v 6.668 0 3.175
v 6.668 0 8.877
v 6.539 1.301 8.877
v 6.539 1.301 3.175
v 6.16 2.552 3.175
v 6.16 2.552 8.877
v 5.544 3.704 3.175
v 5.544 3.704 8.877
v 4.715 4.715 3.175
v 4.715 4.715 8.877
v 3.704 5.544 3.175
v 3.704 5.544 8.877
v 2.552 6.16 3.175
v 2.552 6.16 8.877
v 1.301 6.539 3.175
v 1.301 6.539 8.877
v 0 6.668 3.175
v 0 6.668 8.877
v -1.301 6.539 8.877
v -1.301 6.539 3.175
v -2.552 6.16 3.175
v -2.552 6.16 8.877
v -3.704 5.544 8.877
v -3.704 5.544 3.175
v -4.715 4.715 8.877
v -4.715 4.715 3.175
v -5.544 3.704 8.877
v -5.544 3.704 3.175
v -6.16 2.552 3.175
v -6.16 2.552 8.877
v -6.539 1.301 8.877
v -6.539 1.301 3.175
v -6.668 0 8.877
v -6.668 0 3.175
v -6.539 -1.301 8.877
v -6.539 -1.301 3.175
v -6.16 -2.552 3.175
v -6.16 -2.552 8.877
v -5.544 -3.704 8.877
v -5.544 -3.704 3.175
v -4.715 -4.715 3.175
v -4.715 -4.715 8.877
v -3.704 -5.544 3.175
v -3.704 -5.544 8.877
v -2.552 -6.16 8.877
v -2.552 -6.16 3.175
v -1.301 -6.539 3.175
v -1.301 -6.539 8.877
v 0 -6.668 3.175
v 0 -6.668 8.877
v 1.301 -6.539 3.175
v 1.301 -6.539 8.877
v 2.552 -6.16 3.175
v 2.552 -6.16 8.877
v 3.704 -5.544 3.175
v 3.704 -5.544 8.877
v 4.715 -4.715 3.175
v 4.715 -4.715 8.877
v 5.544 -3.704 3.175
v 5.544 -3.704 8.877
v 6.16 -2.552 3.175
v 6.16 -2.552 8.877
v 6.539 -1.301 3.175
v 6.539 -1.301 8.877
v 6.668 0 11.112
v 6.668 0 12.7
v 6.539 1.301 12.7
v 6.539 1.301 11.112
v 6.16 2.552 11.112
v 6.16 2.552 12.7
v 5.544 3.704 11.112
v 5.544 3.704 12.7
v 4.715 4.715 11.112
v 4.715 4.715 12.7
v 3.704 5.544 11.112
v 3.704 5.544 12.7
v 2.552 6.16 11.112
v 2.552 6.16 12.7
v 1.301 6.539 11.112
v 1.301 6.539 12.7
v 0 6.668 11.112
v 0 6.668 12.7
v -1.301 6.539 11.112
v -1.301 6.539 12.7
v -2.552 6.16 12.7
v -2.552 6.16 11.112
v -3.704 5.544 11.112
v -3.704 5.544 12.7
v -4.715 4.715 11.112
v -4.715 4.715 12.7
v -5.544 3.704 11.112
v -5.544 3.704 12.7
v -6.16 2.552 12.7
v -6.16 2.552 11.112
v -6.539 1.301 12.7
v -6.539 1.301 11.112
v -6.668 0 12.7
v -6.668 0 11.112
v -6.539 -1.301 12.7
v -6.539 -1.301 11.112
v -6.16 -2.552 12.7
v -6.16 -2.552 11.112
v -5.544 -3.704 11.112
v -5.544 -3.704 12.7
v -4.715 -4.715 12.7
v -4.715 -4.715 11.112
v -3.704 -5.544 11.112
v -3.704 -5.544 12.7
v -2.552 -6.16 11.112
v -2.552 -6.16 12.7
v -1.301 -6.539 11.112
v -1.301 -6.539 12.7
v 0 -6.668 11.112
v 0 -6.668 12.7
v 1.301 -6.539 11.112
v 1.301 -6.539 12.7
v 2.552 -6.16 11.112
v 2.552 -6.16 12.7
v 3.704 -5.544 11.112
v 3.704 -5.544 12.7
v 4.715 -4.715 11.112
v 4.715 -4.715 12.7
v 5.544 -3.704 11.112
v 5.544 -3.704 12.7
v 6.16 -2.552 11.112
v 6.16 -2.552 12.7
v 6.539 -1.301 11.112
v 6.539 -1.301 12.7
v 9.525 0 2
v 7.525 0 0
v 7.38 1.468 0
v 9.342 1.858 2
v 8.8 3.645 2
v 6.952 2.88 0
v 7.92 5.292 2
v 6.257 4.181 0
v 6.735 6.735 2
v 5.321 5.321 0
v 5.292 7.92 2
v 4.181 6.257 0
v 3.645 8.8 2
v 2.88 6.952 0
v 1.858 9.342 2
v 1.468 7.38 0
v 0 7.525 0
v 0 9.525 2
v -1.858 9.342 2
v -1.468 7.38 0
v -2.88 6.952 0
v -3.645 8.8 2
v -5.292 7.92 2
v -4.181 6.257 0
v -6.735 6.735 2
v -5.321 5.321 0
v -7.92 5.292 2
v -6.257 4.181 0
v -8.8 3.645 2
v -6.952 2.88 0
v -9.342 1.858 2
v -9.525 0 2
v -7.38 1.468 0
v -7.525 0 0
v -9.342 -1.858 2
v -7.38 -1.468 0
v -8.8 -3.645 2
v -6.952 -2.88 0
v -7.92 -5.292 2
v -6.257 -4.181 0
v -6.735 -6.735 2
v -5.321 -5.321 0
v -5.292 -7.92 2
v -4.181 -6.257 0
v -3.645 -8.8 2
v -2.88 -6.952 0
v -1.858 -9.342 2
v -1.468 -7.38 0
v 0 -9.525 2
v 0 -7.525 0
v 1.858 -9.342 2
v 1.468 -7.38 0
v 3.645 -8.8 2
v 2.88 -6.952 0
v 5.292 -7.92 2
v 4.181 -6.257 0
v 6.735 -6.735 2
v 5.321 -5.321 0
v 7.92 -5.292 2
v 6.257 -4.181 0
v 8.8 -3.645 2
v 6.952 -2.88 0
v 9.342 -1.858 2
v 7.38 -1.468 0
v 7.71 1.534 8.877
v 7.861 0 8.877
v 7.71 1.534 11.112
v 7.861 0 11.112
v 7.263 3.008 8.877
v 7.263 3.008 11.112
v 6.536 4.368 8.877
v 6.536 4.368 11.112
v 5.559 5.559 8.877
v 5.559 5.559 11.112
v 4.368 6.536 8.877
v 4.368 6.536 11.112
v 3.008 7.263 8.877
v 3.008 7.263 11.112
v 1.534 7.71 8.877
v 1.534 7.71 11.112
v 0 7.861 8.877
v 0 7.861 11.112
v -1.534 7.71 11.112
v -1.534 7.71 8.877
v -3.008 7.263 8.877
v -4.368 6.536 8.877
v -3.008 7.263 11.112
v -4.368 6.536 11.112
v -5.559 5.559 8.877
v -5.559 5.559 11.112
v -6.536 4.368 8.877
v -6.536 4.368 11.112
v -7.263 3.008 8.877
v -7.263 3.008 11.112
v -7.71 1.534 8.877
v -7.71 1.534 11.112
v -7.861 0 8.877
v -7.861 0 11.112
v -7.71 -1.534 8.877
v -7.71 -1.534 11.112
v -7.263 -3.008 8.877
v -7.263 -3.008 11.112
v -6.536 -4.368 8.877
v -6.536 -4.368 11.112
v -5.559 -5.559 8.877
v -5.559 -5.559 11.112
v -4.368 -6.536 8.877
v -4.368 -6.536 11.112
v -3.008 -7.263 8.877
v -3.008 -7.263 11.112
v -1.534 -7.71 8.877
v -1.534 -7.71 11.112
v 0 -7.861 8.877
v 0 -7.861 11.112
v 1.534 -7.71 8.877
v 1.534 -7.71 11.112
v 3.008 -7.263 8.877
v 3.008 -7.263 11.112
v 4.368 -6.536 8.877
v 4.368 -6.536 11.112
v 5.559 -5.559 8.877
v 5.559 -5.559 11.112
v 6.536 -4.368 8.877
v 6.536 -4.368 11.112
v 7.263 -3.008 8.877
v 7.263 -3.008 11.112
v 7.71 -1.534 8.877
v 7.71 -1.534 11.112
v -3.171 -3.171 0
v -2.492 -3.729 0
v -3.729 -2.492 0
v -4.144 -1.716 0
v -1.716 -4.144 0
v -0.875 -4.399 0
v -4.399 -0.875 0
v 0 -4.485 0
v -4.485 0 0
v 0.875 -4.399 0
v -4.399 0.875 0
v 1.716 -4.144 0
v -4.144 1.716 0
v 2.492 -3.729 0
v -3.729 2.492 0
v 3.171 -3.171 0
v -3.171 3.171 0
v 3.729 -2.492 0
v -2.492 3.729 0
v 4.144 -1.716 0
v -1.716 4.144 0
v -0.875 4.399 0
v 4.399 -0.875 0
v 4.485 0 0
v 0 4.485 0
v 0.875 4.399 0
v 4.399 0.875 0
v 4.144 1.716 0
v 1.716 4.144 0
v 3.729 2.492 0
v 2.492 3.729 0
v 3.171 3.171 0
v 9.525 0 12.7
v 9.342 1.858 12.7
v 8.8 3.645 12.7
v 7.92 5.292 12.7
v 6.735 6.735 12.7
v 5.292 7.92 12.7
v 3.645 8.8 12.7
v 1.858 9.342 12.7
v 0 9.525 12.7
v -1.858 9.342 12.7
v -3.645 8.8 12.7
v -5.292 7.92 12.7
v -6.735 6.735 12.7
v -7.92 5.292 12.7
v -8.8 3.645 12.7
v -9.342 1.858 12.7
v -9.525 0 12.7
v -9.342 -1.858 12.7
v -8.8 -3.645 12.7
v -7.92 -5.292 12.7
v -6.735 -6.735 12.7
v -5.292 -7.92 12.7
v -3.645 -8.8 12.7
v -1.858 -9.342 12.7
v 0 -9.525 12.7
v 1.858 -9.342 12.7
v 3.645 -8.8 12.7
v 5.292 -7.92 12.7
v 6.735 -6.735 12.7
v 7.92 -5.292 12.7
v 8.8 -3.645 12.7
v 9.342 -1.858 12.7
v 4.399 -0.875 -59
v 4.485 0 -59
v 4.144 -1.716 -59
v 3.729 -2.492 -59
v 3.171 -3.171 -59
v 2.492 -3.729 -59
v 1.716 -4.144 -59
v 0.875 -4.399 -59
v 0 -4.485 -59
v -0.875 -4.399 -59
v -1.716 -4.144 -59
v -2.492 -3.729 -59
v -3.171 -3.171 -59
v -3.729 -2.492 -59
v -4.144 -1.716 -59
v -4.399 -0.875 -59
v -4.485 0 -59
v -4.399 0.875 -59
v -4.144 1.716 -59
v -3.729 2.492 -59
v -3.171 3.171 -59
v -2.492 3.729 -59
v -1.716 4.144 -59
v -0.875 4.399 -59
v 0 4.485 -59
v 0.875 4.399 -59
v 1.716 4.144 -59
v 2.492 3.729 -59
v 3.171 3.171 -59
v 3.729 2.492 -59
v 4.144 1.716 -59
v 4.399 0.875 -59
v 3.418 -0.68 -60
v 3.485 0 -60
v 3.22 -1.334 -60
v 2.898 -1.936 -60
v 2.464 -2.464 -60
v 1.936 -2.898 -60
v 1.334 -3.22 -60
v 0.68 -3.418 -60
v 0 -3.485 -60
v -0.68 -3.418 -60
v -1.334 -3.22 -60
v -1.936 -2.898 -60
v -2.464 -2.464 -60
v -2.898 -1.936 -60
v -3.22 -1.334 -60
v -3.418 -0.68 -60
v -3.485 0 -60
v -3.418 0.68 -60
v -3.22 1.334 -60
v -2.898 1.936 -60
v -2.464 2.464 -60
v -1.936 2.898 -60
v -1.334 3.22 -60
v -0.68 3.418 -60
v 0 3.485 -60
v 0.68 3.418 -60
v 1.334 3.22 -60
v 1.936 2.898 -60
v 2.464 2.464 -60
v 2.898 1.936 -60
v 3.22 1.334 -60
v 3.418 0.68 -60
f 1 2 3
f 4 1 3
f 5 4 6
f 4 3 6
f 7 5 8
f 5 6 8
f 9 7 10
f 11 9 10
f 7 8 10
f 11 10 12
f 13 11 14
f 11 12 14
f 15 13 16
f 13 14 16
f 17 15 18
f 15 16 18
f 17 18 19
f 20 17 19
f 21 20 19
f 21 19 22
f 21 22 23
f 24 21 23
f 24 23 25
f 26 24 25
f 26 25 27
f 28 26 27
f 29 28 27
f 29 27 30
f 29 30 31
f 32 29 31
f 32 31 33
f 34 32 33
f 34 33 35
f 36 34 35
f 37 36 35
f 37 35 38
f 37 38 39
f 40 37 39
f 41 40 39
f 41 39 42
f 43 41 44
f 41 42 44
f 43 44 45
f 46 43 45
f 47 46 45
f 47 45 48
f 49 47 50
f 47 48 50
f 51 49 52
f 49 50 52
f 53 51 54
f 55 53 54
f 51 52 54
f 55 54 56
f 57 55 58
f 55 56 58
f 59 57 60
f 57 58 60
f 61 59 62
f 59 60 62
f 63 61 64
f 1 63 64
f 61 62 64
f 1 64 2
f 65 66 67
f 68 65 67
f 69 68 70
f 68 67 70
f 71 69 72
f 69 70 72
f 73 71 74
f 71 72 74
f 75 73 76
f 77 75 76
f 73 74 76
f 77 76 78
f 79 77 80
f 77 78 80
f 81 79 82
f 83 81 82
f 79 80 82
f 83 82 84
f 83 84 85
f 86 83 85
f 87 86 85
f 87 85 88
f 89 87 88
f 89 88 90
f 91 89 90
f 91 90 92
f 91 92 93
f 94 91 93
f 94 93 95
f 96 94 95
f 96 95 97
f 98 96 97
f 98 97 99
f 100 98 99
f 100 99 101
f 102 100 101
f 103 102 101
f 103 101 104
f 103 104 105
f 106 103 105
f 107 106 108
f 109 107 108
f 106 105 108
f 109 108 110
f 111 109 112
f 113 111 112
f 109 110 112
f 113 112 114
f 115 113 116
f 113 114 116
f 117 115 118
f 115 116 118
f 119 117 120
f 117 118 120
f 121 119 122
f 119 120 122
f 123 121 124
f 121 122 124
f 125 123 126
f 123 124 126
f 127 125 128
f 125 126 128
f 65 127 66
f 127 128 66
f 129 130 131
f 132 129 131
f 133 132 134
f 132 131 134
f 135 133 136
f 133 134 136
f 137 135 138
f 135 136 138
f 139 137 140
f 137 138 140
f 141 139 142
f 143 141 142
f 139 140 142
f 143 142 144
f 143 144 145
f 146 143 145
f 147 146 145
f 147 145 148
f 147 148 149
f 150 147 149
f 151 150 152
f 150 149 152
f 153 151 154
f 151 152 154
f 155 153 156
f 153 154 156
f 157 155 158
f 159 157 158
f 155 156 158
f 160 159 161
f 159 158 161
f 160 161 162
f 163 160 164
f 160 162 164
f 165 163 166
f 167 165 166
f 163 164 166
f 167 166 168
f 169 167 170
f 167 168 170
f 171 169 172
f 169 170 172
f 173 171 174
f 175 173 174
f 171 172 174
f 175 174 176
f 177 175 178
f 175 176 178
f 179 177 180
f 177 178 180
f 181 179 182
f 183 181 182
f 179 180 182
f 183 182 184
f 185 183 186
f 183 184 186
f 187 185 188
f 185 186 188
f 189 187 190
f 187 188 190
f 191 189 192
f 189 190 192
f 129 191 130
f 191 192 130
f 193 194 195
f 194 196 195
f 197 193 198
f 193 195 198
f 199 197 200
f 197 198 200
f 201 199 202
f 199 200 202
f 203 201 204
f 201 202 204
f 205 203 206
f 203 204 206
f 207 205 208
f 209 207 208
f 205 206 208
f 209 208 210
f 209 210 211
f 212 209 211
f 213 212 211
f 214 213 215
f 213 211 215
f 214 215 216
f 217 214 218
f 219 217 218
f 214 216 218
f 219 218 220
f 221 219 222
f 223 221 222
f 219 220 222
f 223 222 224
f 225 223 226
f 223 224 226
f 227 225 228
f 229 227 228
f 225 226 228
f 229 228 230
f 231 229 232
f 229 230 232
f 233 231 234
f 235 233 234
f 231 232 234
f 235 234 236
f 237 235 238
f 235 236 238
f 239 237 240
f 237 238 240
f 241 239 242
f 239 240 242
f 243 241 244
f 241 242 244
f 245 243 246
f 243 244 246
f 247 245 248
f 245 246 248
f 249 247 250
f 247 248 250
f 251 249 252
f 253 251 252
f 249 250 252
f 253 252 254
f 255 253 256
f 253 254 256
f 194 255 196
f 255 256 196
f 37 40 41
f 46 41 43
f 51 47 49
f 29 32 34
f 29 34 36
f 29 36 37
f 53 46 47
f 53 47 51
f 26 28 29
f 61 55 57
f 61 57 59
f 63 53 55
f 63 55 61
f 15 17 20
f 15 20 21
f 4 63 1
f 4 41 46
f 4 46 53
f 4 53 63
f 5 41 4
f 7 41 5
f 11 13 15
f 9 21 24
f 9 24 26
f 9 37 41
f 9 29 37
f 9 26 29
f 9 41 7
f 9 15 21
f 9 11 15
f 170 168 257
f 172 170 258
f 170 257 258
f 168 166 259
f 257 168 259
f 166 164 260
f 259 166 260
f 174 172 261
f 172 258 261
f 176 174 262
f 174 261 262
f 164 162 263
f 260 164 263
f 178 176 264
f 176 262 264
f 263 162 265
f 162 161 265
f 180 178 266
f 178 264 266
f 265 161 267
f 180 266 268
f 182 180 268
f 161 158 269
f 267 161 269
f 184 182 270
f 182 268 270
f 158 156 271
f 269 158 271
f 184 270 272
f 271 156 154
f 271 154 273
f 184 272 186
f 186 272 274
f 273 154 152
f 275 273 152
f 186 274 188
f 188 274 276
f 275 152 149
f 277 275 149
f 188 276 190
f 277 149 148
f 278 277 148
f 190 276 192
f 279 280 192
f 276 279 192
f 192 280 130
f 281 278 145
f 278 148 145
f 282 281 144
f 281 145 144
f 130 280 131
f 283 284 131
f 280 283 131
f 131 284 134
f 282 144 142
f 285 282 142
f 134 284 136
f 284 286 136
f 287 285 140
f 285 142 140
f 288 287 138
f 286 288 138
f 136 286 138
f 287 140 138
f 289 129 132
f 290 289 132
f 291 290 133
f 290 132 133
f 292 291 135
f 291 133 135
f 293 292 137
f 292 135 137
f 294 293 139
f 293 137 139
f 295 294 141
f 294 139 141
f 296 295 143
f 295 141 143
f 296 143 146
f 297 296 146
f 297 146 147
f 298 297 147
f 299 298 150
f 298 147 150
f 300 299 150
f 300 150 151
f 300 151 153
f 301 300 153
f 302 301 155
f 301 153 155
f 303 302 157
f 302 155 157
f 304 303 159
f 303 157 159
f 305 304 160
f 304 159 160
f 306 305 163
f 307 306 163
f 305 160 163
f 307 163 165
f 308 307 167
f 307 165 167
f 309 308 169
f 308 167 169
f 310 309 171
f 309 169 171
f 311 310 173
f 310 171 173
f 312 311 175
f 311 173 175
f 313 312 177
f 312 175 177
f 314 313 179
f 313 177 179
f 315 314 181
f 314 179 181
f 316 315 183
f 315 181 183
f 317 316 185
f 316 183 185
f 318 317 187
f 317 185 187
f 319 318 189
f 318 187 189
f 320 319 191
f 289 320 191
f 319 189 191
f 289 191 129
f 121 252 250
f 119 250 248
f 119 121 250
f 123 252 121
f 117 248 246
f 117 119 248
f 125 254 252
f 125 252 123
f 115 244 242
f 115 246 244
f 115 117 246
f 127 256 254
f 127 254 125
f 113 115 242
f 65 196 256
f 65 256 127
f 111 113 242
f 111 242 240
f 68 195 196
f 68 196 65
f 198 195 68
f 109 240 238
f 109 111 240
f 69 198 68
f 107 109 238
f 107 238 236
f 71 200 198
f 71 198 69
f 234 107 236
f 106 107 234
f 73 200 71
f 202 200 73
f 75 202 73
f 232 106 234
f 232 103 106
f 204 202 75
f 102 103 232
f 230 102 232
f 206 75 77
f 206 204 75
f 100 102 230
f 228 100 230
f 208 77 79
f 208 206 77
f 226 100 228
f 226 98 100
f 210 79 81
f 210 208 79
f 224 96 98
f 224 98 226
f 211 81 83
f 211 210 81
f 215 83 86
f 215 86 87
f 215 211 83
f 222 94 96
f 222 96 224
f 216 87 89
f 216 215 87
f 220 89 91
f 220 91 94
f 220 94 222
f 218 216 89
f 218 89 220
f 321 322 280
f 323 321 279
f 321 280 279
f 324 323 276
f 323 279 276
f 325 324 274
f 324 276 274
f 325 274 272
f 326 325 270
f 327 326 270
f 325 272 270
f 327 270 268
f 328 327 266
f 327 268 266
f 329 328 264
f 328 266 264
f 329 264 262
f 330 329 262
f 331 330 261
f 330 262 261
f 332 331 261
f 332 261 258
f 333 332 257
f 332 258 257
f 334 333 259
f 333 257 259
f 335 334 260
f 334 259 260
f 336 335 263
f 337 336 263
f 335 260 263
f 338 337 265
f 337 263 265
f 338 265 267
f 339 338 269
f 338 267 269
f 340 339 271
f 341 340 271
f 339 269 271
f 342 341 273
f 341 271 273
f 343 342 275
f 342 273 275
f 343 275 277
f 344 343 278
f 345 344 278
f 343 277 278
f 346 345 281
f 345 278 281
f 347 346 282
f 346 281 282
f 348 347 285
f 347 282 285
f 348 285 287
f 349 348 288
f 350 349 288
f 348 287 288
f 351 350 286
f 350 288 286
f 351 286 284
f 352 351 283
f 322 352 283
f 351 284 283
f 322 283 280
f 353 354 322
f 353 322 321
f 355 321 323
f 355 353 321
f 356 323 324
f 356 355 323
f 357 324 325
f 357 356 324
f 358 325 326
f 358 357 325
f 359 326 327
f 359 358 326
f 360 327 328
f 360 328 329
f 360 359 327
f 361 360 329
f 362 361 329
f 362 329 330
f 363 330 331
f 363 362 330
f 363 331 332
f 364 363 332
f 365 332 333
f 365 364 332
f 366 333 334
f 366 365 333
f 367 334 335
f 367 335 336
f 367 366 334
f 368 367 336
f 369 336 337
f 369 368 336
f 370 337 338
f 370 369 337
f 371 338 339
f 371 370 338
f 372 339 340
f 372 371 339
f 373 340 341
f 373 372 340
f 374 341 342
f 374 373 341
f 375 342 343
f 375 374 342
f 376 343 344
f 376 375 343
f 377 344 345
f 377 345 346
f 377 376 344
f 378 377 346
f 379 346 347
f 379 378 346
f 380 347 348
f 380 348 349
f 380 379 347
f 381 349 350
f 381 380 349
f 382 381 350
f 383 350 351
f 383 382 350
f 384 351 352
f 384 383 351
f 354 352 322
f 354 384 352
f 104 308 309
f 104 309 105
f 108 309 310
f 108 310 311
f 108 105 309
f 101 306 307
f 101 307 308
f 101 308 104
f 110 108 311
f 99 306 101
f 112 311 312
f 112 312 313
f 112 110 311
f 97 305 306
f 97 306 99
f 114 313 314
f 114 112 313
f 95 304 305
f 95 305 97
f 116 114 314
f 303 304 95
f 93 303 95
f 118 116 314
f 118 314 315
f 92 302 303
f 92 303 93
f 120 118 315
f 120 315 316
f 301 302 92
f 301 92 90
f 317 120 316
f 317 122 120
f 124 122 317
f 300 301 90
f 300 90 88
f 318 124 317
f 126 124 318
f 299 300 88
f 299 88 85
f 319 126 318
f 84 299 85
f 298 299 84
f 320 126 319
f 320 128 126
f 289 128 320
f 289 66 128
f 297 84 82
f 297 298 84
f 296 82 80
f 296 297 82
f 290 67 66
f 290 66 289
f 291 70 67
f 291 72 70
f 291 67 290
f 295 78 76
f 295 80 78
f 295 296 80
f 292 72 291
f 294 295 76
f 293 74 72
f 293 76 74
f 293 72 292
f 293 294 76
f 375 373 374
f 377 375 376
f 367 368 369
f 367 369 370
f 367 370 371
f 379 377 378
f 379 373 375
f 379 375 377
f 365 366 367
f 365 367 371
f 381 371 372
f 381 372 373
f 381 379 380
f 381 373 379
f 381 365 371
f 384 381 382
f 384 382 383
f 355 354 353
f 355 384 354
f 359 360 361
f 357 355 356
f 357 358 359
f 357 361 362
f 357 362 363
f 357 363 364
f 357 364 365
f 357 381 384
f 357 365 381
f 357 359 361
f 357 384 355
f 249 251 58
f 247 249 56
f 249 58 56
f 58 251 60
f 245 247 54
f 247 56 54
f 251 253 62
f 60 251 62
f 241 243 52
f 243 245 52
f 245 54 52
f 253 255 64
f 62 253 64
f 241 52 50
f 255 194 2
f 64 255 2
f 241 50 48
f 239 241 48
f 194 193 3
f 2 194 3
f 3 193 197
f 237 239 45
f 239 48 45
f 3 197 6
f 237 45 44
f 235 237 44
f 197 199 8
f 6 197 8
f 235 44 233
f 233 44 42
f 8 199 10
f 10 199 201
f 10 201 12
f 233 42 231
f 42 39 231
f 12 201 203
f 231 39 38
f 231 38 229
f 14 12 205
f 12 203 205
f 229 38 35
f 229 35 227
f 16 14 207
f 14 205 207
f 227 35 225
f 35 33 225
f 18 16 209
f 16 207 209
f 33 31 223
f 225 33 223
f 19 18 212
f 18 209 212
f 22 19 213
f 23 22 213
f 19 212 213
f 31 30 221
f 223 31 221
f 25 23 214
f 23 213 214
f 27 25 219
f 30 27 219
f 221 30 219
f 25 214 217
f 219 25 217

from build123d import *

# Parameters (mm, degrees)
F0_R     = 9.525
F1_DEPTH = 12.7
F2_R     = 6.6675
F3_DEPTH = 9.525
F4_W     = 1.1938
F4_H     = 2.2352
F7_SIZE  = 2
F8_R     = 4.485
F9_DEPTH = 60
F10_SIZE = 1


# Not quite as in the source:
# - the program builds the solid bodies; features that only make, move or delete a surface that nothing else refers to are left out


with BuildPart() as f1:
    # F0 (on Top) → F1 (new body)
    with BuildSketch(Plane.XY):
        Circle(F0_R)
    extrude(amount=F1_DEPTH)

    # F2 (on face) → F3 (cut)
    with BuildSketch(Plane.XY.offset(12.7)):
        Circle(F2_R)
    extrude(amount=-F3_DEPTH, mode=Mode.SUBTRACT)

    # F4 (on Front) → F5 (revolve, cut)
    with BuildSketch(Plane.XZ):
        with Locations((7.2644, 9.9949)):
            Rectangle(F4_W, F4_H)
    revolve(axis=Axis((0, 0, 19.0221574157), (0, 0, 1)), mode=Mode.SUBTRACT)

    # F7
    f7_edges = [f1.edges().sort_by_distance(p)[0] for p in [
        (-9.525, 0, 0),
    ]]
    chamfer(f7_edges, length=F7_SIZE)

    # F8 (on face) → F9 (join)
    with BuildSketch(Plane(origin=(0, 0, 0), x_dir=(1, 0, 0), z_dir=(0, 0, -1))):
        Circle(F8_R)
    extrude(amount=F9_DEPTH)

    # F10
    f10_edges = [f1.edges().sort_by_distance(p)[0] for p in [
        (-4.485, 0, -60),
    ]]
    chamfer(f10_edges, length=F10_SIZE)


solid = f1.part
